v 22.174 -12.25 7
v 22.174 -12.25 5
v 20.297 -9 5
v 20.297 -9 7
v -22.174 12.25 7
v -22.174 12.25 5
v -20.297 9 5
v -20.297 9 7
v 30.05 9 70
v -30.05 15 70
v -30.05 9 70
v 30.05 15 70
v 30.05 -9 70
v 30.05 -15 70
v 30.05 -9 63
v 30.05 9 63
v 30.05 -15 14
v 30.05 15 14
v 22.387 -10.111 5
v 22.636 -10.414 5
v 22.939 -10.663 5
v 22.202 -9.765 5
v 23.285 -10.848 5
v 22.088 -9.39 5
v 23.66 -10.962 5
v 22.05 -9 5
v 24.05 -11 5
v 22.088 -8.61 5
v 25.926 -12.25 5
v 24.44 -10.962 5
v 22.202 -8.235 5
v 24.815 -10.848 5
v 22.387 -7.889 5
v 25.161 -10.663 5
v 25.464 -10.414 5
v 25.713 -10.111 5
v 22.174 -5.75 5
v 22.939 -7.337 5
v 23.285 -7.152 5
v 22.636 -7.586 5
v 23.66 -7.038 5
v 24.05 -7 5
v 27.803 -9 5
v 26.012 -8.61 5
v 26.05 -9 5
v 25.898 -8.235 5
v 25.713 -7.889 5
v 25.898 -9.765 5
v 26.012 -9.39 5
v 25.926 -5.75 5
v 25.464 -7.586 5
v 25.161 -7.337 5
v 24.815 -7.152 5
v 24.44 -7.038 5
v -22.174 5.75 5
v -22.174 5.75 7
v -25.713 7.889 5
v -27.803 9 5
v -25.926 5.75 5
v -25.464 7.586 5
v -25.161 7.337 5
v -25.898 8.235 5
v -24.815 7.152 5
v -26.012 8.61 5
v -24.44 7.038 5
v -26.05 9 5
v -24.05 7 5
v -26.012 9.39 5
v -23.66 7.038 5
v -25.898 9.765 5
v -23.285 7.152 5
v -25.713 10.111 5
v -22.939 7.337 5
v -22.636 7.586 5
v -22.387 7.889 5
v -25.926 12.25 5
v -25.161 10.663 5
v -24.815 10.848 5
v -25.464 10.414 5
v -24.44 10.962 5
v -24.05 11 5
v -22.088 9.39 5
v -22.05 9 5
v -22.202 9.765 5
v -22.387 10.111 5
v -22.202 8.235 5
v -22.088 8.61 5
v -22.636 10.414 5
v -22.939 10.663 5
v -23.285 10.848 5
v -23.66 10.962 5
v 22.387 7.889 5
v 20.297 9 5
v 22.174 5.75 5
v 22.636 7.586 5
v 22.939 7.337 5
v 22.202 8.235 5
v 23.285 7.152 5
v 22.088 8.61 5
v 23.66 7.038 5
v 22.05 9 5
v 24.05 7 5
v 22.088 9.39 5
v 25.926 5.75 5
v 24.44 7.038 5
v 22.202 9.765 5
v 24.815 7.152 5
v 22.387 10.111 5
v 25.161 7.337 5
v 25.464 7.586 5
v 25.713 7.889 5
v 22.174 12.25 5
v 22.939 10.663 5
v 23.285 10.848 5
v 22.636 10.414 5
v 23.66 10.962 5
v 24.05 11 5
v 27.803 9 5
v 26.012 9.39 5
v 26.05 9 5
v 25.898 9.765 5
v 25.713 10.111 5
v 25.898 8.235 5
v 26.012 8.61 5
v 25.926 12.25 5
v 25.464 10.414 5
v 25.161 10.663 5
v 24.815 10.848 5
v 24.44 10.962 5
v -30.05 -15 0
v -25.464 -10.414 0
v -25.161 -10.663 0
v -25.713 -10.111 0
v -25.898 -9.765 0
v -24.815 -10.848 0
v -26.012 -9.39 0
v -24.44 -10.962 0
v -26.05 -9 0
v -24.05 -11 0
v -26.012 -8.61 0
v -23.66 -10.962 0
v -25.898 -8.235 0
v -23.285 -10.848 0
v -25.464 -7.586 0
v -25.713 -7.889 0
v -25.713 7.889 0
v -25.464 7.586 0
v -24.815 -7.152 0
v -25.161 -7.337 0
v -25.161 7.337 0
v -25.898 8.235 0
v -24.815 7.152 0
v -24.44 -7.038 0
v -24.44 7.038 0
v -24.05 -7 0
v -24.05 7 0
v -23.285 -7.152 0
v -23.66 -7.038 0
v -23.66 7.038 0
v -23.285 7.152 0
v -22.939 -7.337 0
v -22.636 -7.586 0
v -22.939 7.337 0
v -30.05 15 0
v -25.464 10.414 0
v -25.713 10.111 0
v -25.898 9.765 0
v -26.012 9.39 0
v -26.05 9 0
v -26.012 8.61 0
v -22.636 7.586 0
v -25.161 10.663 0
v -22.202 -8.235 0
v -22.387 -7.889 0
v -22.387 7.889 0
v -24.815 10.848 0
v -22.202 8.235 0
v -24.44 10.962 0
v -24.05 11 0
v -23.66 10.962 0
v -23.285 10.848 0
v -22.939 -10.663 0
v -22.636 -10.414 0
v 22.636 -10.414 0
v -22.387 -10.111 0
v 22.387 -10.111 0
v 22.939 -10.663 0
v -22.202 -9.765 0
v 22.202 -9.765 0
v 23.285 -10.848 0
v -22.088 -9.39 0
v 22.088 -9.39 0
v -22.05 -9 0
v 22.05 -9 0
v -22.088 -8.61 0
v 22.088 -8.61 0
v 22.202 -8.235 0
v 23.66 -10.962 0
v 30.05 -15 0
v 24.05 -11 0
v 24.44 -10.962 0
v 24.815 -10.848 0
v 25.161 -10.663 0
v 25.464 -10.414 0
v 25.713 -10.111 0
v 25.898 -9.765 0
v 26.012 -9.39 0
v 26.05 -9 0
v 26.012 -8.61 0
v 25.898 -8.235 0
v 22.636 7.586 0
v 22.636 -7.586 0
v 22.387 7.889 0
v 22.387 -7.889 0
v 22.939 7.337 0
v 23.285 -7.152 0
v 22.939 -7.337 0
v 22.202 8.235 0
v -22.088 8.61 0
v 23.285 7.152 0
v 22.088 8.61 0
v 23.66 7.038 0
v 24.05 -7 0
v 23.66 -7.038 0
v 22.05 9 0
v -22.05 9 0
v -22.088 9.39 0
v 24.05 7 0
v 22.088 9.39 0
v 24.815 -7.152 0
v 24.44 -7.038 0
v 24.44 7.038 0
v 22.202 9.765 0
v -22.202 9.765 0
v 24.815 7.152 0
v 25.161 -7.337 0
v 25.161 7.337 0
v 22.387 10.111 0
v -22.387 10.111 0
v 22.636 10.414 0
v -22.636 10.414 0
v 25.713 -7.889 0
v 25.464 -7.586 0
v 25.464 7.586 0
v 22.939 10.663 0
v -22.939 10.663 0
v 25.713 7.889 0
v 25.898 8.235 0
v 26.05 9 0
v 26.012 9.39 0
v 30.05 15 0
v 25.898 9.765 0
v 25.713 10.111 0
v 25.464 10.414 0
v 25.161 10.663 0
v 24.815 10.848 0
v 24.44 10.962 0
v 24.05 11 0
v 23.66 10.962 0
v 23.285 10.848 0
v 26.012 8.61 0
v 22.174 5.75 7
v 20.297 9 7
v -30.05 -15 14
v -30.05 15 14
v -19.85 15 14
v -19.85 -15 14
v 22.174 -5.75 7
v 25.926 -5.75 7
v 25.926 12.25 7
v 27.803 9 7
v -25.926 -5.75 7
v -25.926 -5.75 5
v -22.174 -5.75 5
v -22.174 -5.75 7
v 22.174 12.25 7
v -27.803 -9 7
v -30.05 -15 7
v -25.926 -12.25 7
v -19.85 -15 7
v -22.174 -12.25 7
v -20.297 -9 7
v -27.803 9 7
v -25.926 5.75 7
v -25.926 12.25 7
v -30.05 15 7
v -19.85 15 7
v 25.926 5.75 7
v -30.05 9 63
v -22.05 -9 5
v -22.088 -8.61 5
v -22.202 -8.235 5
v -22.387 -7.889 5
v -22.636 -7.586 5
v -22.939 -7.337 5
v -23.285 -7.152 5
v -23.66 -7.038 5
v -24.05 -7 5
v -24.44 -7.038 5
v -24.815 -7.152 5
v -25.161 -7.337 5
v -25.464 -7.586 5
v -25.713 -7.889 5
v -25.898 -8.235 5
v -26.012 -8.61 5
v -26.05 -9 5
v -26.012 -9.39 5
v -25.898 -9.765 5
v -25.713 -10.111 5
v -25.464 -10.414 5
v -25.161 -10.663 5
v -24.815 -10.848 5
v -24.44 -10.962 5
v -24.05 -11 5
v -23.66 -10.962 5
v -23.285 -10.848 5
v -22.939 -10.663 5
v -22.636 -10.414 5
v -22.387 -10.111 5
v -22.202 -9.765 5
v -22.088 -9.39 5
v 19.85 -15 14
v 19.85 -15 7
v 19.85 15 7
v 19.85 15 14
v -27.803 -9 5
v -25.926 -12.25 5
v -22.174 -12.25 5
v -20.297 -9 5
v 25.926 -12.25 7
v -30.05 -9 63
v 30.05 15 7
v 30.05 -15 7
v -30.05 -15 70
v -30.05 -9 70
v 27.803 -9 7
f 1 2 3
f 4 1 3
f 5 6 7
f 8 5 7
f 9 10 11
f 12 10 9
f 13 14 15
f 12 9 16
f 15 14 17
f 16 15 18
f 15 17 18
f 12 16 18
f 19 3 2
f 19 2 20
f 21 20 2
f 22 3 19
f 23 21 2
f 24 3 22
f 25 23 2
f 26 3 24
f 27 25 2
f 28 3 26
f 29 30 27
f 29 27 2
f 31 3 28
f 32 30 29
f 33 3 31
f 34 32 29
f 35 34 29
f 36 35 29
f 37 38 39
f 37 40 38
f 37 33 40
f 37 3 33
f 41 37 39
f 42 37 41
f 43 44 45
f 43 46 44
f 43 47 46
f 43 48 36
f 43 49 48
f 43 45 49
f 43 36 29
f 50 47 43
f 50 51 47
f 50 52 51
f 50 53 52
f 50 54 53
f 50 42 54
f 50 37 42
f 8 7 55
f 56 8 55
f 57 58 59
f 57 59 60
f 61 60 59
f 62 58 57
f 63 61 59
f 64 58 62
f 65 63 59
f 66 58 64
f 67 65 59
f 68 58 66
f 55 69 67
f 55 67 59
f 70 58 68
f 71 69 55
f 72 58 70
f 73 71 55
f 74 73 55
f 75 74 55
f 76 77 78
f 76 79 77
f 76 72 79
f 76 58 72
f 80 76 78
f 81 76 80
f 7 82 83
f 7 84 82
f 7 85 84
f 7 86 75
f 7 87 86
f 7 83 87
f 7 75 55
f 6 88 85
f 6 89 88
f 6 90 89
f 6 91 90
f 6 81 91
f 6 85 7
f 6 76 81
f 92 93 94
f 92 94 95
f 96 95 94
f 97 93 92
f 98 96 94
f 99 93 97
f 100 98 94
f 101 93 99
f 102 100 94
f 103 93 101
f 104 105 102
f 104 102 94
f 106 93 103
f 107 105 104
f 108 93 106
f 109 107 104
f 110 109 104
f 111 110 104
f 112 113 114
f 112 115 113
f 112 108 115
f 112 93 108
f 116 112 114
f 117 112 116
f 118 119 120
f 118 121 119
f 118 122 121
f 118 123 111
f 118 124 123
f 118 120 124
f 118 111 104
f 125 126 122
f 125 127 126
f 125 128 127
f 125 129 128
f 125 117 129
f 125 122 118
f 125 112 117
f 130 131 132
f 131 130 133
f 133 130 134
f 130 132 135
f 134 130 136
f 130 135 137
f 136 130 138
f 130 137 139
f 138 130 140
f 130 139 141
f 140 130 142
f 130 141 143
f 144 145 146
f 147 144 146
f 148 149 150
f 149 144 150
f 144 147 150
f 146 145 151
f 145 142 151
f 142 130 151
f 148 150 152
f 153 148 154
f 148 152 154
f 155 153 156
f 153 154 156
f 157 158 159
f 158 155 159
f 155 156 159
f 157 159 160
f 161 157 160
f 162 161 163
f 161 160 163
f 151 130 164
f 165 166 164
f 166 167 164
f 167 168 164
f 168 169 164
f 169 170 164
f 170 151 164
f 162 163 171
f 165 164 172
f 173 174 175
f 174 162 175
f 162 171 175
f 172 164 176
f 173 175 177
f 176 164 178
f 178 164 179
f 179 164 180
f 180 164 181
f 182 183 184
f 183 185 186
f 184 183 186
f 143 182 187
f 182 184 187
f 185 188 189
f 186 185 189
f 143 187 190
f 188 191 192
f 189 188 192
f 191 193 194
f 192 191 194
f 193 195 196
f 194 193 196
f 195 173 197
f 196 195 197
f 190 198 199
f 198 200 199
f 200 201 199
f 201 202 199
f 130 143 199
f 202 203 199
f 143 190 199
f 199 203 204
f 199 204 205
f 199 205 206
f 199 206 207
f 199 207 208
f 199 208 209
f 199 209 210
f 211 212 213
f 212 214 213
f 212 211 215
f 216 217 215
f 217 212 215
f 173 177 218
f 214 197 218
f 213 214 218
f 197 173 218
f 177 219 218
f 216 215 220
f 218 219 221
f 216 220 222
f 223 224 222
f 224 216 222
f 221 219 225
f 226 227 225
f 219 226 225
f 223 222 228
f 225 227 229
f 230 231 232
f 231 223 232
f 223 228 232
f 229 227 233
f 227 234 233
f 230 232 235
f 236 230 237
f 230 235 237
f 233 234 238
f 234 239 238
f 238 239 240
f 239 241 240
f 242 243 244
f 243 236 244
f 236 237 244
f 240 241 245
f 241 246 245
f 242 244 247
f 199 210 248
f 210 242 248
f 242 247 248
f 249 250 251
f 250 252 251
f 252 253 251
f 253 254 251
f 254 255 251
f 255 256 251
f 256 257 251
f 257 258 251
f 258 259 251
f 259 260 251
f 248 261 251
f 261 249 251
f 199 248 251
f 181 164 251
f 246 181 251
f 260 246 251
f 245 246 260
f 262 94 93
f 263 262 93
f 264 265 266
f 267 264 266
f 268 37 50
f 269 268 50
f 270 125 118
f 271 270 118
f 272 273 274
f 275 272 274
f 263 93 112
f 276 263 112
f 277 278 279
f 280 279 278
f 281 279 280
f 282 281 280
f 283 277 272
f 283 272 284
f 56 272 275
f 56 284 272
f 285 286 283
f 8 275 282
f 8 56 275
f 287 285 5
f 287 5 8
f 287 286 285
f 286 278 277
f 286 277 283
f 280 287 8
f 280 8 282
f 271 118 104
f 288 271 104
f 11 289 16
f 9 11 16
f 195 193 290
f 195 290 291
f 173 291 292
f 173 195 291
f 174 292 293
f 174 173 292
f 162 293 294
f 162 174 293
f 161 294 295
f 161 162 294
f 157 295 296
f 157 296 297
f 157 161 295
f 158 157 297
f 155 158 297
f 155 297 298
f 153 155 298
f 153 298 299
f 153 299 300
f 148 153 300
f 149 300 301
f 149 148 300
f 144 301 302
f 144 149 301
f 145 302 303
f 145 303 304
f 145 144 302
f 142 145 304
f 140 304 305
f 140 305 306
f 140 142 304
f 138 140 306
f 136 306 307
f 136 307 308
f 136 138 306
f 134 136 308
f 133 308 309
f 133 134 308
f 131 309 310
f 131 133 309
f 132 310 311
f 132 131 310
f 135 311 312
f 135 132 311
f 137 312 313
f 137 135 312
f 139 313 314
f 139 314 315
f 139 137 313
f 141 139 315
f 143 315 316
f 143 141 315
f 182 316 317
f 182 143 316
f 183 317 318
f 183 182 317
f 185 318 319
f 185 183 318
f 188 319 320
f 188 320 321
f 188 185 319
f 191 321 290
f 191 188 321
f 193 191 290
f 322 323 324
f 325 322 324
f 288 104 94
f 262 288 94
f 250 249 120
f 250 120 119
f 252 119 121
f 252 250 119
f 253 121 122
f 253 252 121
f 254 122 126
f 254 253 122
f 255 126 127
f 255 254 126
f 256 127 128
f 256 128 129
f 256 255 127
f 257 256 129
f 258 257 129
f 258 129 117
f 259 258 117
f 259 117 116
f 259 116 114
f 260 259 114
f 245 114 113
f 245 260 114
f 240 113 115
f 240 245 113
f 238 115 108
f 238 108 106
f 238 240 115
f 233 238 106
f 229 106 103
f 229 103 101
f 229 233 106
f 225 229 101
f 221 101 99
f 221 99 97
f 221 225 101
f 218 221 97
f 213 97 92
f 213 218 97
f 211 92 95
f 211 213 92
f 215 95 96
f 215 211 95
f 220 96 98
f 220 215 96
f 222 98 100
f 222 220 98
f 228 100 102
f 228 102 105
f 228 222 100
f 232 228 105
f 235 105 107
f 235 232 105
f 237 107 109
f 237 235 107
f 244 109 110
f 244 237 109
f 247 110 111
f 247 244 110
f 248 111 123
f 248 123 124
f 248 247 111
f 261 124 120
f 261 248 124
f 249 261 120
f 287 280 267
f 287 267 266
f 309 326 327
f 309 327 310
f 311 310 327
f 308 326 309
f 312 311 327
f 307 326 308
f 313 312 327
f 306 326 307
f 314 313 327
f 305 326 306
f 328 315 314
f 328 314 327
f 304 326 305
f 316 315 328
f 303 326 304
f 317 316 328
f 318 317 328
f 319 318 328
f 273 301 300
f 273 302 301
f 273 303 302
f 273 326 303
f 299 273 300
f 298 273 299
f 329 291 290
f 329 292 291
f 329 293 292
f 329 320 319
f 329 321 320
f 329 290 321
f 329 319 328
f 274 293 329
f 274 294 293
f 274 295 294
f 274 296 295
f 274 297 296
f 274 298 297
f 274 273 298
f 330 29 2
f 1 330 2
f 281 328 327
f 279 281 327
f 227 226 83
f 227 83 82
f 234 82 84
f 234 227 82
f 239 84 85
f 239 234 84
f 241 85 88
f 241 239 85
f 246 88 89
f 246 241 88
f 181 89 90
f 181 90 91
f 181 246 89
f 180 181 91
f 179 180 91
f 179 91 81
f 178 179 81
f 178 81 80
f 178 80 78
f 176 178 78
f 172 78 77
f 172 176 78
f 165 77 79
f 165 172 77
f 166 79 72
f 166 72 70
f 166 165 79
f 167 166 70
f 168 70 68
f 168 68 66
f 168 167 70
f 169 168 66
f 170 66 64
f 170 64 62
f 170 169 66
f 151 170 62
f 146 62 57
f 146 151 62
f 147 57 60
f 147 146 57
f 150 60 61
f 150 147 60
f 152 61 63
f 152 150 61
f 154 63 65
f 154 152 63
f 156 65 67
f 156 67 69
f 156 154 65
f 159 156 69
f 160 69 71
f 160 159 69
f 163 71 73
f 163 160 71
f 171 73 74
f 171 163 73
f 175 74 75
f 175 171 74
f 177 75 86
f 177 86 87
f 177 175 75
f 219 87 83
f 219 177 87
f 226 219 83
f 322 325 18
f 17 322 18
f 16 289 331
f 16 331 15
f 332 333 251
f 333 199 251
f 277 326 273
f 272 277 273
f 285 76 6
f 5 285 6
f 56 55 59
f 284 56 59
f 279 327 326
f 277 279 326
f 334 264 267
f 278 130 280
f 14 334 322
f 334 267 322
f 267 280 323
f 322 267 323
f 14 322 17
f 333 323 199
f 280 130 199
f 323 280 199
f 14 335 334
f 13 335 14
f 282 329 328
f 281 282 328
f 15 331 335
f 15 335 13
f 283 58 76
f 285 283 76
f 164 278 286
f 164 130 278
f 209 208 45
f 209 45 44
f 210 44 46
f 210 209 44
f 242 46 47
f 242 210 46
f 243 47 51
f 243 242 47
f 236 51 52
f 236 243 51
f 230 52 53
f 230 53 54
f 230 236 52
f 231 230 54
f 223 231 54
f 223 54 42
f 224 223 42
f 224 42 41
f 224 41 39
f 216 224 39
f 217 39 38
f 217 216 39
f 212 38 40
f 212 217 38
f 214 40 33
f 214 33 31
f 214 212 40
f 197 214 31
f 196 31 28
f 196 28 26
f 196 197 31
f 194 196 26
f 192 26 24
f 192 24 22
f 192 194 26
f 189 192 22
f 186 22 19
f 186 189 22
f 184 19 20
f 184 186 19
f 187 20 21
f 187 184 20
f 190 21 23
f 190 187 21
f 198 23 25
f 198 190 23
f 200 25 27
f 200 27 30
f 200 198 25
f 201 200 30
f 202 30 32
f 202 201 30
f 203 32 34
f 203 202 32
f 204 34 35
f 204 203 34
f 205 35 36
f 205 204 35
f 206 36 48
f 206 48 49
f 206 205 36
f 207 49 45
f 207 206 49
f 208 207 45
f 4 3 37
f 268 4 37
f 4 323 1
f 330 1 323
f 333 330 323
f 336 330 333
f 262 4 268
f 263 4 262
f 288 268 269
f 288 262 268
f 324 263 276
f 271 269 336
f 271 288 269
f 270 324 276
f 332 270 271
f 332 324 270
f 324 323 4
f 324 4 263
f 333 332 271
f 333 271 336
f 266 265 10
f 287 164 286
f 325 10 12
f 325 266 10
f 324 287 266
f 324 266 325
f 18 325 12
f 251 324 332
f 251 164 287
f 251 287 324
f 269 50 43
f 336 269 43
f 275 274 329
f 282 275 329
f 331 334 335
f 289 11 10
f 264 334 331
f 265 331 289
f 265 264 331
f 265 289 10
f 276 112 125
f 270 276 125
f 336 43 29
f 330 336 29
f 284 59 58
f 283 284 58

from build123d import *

# Parameters (mm, degrees)
F0_W     = 60.1
F0_H     = 30
F0_R     = 2
F1_DEPTH = 5
F2_W     = 60.1
F2_H     = 30
F3_DEPTH = 2
F4_W     = 39.7
F4_H     = 30
F5_DEPTH = 7
F6_W     = 60.1
F6_H     = 30
F7_DEPTH = 49
F8_W     = 60.1
F8_H     = 6
F9_DEPTH = 7


with BuildPart() as f1:
    # F0 (on Top) → F1 (new body)
    with BuildSketch(Plane.XY):
        Rectangle(F0_W, F0_H)
        with Locations((-24.05, -9)):
            Circle(F0_R, mode=Mode.SUBTRACT)
        with Locations((24.05, -9)):
            Circle(F0_R, mode=Mode.SUBTRACT)
        with Locations((-24.05, 9)):
            Circle(F0_R, mode=Mode.SUBTRACT)
        with Locations((24.05, 9)):
            Circle(F0_R, mode=Mode.SUBTRACT)
    extrude(amount=F1_DEPTH)

    # F2 (on face) → F3 (join)
    with BuildSketch(Plane.XY.offset(5)):
        Rectangle(F2_W, F2_H)
        Polygon((-25.9263883749, -5.75), (-22.1736116251, -5.75), (-20.2972232503, -9), (-22.1736116251, -12.25), (-25.9263883749, -12.25), (-27.8027767497, -9), align=None, mode=Mode.SUBTRACT)
        Polygon((20.2972232503, -9), (22.1736116251, -5.75), (25.9263883749, -5.75), (27.8027767497, -9), (25.9263883749, -12.25), (22.1736116251, -12.25), align=None, mode=Mode.SUBTRACT)
        Polygon((-22.1736116251, 5.75), (-25.9263883749, 5.75), (-27.8027767497, 9), (-25.9263883749, 12.25), (-22.1736116251, 12.25), (-20.2972232503, 9), align=None, mode=Mode.SUBTRACT)
        Polygon((25.9263883749, 5.75), (22.1736116251, 5.75), (20.2972232503, 9), (22.1736116251, 12.25), (25.9263883749, 12.25), (27.8027767497, 9), align=None, mode=Mode.SUBTRACT)
    extrude(amount=F3_DEPTH)

    # F4 (on face) → F5 (join)
    with BuildSketch(Plane.XY.offset(7)):
        Rectangle(F4_W, F4_H)
    extrude(amount=F5_DEPTH)

    # F6 (on face) → F7 (join)
    with BuildSketch(Plane.XY.offset(14)):
        Rectangle(F6_W, F6_H)
    extrude(amount=F7_DEPTH)

    # F8 (on face) → F9 (join)
    with BuildSketch(Plane.XY.offset(63)):
        with Locations((0, 12)):
            Rectangle(F8_W, F8_H)
        with Locations((0, -12)):
            Rectangle(F8_W, F8_H)
    extrude(amount=F9_DEPTH)


solid = f1.part
